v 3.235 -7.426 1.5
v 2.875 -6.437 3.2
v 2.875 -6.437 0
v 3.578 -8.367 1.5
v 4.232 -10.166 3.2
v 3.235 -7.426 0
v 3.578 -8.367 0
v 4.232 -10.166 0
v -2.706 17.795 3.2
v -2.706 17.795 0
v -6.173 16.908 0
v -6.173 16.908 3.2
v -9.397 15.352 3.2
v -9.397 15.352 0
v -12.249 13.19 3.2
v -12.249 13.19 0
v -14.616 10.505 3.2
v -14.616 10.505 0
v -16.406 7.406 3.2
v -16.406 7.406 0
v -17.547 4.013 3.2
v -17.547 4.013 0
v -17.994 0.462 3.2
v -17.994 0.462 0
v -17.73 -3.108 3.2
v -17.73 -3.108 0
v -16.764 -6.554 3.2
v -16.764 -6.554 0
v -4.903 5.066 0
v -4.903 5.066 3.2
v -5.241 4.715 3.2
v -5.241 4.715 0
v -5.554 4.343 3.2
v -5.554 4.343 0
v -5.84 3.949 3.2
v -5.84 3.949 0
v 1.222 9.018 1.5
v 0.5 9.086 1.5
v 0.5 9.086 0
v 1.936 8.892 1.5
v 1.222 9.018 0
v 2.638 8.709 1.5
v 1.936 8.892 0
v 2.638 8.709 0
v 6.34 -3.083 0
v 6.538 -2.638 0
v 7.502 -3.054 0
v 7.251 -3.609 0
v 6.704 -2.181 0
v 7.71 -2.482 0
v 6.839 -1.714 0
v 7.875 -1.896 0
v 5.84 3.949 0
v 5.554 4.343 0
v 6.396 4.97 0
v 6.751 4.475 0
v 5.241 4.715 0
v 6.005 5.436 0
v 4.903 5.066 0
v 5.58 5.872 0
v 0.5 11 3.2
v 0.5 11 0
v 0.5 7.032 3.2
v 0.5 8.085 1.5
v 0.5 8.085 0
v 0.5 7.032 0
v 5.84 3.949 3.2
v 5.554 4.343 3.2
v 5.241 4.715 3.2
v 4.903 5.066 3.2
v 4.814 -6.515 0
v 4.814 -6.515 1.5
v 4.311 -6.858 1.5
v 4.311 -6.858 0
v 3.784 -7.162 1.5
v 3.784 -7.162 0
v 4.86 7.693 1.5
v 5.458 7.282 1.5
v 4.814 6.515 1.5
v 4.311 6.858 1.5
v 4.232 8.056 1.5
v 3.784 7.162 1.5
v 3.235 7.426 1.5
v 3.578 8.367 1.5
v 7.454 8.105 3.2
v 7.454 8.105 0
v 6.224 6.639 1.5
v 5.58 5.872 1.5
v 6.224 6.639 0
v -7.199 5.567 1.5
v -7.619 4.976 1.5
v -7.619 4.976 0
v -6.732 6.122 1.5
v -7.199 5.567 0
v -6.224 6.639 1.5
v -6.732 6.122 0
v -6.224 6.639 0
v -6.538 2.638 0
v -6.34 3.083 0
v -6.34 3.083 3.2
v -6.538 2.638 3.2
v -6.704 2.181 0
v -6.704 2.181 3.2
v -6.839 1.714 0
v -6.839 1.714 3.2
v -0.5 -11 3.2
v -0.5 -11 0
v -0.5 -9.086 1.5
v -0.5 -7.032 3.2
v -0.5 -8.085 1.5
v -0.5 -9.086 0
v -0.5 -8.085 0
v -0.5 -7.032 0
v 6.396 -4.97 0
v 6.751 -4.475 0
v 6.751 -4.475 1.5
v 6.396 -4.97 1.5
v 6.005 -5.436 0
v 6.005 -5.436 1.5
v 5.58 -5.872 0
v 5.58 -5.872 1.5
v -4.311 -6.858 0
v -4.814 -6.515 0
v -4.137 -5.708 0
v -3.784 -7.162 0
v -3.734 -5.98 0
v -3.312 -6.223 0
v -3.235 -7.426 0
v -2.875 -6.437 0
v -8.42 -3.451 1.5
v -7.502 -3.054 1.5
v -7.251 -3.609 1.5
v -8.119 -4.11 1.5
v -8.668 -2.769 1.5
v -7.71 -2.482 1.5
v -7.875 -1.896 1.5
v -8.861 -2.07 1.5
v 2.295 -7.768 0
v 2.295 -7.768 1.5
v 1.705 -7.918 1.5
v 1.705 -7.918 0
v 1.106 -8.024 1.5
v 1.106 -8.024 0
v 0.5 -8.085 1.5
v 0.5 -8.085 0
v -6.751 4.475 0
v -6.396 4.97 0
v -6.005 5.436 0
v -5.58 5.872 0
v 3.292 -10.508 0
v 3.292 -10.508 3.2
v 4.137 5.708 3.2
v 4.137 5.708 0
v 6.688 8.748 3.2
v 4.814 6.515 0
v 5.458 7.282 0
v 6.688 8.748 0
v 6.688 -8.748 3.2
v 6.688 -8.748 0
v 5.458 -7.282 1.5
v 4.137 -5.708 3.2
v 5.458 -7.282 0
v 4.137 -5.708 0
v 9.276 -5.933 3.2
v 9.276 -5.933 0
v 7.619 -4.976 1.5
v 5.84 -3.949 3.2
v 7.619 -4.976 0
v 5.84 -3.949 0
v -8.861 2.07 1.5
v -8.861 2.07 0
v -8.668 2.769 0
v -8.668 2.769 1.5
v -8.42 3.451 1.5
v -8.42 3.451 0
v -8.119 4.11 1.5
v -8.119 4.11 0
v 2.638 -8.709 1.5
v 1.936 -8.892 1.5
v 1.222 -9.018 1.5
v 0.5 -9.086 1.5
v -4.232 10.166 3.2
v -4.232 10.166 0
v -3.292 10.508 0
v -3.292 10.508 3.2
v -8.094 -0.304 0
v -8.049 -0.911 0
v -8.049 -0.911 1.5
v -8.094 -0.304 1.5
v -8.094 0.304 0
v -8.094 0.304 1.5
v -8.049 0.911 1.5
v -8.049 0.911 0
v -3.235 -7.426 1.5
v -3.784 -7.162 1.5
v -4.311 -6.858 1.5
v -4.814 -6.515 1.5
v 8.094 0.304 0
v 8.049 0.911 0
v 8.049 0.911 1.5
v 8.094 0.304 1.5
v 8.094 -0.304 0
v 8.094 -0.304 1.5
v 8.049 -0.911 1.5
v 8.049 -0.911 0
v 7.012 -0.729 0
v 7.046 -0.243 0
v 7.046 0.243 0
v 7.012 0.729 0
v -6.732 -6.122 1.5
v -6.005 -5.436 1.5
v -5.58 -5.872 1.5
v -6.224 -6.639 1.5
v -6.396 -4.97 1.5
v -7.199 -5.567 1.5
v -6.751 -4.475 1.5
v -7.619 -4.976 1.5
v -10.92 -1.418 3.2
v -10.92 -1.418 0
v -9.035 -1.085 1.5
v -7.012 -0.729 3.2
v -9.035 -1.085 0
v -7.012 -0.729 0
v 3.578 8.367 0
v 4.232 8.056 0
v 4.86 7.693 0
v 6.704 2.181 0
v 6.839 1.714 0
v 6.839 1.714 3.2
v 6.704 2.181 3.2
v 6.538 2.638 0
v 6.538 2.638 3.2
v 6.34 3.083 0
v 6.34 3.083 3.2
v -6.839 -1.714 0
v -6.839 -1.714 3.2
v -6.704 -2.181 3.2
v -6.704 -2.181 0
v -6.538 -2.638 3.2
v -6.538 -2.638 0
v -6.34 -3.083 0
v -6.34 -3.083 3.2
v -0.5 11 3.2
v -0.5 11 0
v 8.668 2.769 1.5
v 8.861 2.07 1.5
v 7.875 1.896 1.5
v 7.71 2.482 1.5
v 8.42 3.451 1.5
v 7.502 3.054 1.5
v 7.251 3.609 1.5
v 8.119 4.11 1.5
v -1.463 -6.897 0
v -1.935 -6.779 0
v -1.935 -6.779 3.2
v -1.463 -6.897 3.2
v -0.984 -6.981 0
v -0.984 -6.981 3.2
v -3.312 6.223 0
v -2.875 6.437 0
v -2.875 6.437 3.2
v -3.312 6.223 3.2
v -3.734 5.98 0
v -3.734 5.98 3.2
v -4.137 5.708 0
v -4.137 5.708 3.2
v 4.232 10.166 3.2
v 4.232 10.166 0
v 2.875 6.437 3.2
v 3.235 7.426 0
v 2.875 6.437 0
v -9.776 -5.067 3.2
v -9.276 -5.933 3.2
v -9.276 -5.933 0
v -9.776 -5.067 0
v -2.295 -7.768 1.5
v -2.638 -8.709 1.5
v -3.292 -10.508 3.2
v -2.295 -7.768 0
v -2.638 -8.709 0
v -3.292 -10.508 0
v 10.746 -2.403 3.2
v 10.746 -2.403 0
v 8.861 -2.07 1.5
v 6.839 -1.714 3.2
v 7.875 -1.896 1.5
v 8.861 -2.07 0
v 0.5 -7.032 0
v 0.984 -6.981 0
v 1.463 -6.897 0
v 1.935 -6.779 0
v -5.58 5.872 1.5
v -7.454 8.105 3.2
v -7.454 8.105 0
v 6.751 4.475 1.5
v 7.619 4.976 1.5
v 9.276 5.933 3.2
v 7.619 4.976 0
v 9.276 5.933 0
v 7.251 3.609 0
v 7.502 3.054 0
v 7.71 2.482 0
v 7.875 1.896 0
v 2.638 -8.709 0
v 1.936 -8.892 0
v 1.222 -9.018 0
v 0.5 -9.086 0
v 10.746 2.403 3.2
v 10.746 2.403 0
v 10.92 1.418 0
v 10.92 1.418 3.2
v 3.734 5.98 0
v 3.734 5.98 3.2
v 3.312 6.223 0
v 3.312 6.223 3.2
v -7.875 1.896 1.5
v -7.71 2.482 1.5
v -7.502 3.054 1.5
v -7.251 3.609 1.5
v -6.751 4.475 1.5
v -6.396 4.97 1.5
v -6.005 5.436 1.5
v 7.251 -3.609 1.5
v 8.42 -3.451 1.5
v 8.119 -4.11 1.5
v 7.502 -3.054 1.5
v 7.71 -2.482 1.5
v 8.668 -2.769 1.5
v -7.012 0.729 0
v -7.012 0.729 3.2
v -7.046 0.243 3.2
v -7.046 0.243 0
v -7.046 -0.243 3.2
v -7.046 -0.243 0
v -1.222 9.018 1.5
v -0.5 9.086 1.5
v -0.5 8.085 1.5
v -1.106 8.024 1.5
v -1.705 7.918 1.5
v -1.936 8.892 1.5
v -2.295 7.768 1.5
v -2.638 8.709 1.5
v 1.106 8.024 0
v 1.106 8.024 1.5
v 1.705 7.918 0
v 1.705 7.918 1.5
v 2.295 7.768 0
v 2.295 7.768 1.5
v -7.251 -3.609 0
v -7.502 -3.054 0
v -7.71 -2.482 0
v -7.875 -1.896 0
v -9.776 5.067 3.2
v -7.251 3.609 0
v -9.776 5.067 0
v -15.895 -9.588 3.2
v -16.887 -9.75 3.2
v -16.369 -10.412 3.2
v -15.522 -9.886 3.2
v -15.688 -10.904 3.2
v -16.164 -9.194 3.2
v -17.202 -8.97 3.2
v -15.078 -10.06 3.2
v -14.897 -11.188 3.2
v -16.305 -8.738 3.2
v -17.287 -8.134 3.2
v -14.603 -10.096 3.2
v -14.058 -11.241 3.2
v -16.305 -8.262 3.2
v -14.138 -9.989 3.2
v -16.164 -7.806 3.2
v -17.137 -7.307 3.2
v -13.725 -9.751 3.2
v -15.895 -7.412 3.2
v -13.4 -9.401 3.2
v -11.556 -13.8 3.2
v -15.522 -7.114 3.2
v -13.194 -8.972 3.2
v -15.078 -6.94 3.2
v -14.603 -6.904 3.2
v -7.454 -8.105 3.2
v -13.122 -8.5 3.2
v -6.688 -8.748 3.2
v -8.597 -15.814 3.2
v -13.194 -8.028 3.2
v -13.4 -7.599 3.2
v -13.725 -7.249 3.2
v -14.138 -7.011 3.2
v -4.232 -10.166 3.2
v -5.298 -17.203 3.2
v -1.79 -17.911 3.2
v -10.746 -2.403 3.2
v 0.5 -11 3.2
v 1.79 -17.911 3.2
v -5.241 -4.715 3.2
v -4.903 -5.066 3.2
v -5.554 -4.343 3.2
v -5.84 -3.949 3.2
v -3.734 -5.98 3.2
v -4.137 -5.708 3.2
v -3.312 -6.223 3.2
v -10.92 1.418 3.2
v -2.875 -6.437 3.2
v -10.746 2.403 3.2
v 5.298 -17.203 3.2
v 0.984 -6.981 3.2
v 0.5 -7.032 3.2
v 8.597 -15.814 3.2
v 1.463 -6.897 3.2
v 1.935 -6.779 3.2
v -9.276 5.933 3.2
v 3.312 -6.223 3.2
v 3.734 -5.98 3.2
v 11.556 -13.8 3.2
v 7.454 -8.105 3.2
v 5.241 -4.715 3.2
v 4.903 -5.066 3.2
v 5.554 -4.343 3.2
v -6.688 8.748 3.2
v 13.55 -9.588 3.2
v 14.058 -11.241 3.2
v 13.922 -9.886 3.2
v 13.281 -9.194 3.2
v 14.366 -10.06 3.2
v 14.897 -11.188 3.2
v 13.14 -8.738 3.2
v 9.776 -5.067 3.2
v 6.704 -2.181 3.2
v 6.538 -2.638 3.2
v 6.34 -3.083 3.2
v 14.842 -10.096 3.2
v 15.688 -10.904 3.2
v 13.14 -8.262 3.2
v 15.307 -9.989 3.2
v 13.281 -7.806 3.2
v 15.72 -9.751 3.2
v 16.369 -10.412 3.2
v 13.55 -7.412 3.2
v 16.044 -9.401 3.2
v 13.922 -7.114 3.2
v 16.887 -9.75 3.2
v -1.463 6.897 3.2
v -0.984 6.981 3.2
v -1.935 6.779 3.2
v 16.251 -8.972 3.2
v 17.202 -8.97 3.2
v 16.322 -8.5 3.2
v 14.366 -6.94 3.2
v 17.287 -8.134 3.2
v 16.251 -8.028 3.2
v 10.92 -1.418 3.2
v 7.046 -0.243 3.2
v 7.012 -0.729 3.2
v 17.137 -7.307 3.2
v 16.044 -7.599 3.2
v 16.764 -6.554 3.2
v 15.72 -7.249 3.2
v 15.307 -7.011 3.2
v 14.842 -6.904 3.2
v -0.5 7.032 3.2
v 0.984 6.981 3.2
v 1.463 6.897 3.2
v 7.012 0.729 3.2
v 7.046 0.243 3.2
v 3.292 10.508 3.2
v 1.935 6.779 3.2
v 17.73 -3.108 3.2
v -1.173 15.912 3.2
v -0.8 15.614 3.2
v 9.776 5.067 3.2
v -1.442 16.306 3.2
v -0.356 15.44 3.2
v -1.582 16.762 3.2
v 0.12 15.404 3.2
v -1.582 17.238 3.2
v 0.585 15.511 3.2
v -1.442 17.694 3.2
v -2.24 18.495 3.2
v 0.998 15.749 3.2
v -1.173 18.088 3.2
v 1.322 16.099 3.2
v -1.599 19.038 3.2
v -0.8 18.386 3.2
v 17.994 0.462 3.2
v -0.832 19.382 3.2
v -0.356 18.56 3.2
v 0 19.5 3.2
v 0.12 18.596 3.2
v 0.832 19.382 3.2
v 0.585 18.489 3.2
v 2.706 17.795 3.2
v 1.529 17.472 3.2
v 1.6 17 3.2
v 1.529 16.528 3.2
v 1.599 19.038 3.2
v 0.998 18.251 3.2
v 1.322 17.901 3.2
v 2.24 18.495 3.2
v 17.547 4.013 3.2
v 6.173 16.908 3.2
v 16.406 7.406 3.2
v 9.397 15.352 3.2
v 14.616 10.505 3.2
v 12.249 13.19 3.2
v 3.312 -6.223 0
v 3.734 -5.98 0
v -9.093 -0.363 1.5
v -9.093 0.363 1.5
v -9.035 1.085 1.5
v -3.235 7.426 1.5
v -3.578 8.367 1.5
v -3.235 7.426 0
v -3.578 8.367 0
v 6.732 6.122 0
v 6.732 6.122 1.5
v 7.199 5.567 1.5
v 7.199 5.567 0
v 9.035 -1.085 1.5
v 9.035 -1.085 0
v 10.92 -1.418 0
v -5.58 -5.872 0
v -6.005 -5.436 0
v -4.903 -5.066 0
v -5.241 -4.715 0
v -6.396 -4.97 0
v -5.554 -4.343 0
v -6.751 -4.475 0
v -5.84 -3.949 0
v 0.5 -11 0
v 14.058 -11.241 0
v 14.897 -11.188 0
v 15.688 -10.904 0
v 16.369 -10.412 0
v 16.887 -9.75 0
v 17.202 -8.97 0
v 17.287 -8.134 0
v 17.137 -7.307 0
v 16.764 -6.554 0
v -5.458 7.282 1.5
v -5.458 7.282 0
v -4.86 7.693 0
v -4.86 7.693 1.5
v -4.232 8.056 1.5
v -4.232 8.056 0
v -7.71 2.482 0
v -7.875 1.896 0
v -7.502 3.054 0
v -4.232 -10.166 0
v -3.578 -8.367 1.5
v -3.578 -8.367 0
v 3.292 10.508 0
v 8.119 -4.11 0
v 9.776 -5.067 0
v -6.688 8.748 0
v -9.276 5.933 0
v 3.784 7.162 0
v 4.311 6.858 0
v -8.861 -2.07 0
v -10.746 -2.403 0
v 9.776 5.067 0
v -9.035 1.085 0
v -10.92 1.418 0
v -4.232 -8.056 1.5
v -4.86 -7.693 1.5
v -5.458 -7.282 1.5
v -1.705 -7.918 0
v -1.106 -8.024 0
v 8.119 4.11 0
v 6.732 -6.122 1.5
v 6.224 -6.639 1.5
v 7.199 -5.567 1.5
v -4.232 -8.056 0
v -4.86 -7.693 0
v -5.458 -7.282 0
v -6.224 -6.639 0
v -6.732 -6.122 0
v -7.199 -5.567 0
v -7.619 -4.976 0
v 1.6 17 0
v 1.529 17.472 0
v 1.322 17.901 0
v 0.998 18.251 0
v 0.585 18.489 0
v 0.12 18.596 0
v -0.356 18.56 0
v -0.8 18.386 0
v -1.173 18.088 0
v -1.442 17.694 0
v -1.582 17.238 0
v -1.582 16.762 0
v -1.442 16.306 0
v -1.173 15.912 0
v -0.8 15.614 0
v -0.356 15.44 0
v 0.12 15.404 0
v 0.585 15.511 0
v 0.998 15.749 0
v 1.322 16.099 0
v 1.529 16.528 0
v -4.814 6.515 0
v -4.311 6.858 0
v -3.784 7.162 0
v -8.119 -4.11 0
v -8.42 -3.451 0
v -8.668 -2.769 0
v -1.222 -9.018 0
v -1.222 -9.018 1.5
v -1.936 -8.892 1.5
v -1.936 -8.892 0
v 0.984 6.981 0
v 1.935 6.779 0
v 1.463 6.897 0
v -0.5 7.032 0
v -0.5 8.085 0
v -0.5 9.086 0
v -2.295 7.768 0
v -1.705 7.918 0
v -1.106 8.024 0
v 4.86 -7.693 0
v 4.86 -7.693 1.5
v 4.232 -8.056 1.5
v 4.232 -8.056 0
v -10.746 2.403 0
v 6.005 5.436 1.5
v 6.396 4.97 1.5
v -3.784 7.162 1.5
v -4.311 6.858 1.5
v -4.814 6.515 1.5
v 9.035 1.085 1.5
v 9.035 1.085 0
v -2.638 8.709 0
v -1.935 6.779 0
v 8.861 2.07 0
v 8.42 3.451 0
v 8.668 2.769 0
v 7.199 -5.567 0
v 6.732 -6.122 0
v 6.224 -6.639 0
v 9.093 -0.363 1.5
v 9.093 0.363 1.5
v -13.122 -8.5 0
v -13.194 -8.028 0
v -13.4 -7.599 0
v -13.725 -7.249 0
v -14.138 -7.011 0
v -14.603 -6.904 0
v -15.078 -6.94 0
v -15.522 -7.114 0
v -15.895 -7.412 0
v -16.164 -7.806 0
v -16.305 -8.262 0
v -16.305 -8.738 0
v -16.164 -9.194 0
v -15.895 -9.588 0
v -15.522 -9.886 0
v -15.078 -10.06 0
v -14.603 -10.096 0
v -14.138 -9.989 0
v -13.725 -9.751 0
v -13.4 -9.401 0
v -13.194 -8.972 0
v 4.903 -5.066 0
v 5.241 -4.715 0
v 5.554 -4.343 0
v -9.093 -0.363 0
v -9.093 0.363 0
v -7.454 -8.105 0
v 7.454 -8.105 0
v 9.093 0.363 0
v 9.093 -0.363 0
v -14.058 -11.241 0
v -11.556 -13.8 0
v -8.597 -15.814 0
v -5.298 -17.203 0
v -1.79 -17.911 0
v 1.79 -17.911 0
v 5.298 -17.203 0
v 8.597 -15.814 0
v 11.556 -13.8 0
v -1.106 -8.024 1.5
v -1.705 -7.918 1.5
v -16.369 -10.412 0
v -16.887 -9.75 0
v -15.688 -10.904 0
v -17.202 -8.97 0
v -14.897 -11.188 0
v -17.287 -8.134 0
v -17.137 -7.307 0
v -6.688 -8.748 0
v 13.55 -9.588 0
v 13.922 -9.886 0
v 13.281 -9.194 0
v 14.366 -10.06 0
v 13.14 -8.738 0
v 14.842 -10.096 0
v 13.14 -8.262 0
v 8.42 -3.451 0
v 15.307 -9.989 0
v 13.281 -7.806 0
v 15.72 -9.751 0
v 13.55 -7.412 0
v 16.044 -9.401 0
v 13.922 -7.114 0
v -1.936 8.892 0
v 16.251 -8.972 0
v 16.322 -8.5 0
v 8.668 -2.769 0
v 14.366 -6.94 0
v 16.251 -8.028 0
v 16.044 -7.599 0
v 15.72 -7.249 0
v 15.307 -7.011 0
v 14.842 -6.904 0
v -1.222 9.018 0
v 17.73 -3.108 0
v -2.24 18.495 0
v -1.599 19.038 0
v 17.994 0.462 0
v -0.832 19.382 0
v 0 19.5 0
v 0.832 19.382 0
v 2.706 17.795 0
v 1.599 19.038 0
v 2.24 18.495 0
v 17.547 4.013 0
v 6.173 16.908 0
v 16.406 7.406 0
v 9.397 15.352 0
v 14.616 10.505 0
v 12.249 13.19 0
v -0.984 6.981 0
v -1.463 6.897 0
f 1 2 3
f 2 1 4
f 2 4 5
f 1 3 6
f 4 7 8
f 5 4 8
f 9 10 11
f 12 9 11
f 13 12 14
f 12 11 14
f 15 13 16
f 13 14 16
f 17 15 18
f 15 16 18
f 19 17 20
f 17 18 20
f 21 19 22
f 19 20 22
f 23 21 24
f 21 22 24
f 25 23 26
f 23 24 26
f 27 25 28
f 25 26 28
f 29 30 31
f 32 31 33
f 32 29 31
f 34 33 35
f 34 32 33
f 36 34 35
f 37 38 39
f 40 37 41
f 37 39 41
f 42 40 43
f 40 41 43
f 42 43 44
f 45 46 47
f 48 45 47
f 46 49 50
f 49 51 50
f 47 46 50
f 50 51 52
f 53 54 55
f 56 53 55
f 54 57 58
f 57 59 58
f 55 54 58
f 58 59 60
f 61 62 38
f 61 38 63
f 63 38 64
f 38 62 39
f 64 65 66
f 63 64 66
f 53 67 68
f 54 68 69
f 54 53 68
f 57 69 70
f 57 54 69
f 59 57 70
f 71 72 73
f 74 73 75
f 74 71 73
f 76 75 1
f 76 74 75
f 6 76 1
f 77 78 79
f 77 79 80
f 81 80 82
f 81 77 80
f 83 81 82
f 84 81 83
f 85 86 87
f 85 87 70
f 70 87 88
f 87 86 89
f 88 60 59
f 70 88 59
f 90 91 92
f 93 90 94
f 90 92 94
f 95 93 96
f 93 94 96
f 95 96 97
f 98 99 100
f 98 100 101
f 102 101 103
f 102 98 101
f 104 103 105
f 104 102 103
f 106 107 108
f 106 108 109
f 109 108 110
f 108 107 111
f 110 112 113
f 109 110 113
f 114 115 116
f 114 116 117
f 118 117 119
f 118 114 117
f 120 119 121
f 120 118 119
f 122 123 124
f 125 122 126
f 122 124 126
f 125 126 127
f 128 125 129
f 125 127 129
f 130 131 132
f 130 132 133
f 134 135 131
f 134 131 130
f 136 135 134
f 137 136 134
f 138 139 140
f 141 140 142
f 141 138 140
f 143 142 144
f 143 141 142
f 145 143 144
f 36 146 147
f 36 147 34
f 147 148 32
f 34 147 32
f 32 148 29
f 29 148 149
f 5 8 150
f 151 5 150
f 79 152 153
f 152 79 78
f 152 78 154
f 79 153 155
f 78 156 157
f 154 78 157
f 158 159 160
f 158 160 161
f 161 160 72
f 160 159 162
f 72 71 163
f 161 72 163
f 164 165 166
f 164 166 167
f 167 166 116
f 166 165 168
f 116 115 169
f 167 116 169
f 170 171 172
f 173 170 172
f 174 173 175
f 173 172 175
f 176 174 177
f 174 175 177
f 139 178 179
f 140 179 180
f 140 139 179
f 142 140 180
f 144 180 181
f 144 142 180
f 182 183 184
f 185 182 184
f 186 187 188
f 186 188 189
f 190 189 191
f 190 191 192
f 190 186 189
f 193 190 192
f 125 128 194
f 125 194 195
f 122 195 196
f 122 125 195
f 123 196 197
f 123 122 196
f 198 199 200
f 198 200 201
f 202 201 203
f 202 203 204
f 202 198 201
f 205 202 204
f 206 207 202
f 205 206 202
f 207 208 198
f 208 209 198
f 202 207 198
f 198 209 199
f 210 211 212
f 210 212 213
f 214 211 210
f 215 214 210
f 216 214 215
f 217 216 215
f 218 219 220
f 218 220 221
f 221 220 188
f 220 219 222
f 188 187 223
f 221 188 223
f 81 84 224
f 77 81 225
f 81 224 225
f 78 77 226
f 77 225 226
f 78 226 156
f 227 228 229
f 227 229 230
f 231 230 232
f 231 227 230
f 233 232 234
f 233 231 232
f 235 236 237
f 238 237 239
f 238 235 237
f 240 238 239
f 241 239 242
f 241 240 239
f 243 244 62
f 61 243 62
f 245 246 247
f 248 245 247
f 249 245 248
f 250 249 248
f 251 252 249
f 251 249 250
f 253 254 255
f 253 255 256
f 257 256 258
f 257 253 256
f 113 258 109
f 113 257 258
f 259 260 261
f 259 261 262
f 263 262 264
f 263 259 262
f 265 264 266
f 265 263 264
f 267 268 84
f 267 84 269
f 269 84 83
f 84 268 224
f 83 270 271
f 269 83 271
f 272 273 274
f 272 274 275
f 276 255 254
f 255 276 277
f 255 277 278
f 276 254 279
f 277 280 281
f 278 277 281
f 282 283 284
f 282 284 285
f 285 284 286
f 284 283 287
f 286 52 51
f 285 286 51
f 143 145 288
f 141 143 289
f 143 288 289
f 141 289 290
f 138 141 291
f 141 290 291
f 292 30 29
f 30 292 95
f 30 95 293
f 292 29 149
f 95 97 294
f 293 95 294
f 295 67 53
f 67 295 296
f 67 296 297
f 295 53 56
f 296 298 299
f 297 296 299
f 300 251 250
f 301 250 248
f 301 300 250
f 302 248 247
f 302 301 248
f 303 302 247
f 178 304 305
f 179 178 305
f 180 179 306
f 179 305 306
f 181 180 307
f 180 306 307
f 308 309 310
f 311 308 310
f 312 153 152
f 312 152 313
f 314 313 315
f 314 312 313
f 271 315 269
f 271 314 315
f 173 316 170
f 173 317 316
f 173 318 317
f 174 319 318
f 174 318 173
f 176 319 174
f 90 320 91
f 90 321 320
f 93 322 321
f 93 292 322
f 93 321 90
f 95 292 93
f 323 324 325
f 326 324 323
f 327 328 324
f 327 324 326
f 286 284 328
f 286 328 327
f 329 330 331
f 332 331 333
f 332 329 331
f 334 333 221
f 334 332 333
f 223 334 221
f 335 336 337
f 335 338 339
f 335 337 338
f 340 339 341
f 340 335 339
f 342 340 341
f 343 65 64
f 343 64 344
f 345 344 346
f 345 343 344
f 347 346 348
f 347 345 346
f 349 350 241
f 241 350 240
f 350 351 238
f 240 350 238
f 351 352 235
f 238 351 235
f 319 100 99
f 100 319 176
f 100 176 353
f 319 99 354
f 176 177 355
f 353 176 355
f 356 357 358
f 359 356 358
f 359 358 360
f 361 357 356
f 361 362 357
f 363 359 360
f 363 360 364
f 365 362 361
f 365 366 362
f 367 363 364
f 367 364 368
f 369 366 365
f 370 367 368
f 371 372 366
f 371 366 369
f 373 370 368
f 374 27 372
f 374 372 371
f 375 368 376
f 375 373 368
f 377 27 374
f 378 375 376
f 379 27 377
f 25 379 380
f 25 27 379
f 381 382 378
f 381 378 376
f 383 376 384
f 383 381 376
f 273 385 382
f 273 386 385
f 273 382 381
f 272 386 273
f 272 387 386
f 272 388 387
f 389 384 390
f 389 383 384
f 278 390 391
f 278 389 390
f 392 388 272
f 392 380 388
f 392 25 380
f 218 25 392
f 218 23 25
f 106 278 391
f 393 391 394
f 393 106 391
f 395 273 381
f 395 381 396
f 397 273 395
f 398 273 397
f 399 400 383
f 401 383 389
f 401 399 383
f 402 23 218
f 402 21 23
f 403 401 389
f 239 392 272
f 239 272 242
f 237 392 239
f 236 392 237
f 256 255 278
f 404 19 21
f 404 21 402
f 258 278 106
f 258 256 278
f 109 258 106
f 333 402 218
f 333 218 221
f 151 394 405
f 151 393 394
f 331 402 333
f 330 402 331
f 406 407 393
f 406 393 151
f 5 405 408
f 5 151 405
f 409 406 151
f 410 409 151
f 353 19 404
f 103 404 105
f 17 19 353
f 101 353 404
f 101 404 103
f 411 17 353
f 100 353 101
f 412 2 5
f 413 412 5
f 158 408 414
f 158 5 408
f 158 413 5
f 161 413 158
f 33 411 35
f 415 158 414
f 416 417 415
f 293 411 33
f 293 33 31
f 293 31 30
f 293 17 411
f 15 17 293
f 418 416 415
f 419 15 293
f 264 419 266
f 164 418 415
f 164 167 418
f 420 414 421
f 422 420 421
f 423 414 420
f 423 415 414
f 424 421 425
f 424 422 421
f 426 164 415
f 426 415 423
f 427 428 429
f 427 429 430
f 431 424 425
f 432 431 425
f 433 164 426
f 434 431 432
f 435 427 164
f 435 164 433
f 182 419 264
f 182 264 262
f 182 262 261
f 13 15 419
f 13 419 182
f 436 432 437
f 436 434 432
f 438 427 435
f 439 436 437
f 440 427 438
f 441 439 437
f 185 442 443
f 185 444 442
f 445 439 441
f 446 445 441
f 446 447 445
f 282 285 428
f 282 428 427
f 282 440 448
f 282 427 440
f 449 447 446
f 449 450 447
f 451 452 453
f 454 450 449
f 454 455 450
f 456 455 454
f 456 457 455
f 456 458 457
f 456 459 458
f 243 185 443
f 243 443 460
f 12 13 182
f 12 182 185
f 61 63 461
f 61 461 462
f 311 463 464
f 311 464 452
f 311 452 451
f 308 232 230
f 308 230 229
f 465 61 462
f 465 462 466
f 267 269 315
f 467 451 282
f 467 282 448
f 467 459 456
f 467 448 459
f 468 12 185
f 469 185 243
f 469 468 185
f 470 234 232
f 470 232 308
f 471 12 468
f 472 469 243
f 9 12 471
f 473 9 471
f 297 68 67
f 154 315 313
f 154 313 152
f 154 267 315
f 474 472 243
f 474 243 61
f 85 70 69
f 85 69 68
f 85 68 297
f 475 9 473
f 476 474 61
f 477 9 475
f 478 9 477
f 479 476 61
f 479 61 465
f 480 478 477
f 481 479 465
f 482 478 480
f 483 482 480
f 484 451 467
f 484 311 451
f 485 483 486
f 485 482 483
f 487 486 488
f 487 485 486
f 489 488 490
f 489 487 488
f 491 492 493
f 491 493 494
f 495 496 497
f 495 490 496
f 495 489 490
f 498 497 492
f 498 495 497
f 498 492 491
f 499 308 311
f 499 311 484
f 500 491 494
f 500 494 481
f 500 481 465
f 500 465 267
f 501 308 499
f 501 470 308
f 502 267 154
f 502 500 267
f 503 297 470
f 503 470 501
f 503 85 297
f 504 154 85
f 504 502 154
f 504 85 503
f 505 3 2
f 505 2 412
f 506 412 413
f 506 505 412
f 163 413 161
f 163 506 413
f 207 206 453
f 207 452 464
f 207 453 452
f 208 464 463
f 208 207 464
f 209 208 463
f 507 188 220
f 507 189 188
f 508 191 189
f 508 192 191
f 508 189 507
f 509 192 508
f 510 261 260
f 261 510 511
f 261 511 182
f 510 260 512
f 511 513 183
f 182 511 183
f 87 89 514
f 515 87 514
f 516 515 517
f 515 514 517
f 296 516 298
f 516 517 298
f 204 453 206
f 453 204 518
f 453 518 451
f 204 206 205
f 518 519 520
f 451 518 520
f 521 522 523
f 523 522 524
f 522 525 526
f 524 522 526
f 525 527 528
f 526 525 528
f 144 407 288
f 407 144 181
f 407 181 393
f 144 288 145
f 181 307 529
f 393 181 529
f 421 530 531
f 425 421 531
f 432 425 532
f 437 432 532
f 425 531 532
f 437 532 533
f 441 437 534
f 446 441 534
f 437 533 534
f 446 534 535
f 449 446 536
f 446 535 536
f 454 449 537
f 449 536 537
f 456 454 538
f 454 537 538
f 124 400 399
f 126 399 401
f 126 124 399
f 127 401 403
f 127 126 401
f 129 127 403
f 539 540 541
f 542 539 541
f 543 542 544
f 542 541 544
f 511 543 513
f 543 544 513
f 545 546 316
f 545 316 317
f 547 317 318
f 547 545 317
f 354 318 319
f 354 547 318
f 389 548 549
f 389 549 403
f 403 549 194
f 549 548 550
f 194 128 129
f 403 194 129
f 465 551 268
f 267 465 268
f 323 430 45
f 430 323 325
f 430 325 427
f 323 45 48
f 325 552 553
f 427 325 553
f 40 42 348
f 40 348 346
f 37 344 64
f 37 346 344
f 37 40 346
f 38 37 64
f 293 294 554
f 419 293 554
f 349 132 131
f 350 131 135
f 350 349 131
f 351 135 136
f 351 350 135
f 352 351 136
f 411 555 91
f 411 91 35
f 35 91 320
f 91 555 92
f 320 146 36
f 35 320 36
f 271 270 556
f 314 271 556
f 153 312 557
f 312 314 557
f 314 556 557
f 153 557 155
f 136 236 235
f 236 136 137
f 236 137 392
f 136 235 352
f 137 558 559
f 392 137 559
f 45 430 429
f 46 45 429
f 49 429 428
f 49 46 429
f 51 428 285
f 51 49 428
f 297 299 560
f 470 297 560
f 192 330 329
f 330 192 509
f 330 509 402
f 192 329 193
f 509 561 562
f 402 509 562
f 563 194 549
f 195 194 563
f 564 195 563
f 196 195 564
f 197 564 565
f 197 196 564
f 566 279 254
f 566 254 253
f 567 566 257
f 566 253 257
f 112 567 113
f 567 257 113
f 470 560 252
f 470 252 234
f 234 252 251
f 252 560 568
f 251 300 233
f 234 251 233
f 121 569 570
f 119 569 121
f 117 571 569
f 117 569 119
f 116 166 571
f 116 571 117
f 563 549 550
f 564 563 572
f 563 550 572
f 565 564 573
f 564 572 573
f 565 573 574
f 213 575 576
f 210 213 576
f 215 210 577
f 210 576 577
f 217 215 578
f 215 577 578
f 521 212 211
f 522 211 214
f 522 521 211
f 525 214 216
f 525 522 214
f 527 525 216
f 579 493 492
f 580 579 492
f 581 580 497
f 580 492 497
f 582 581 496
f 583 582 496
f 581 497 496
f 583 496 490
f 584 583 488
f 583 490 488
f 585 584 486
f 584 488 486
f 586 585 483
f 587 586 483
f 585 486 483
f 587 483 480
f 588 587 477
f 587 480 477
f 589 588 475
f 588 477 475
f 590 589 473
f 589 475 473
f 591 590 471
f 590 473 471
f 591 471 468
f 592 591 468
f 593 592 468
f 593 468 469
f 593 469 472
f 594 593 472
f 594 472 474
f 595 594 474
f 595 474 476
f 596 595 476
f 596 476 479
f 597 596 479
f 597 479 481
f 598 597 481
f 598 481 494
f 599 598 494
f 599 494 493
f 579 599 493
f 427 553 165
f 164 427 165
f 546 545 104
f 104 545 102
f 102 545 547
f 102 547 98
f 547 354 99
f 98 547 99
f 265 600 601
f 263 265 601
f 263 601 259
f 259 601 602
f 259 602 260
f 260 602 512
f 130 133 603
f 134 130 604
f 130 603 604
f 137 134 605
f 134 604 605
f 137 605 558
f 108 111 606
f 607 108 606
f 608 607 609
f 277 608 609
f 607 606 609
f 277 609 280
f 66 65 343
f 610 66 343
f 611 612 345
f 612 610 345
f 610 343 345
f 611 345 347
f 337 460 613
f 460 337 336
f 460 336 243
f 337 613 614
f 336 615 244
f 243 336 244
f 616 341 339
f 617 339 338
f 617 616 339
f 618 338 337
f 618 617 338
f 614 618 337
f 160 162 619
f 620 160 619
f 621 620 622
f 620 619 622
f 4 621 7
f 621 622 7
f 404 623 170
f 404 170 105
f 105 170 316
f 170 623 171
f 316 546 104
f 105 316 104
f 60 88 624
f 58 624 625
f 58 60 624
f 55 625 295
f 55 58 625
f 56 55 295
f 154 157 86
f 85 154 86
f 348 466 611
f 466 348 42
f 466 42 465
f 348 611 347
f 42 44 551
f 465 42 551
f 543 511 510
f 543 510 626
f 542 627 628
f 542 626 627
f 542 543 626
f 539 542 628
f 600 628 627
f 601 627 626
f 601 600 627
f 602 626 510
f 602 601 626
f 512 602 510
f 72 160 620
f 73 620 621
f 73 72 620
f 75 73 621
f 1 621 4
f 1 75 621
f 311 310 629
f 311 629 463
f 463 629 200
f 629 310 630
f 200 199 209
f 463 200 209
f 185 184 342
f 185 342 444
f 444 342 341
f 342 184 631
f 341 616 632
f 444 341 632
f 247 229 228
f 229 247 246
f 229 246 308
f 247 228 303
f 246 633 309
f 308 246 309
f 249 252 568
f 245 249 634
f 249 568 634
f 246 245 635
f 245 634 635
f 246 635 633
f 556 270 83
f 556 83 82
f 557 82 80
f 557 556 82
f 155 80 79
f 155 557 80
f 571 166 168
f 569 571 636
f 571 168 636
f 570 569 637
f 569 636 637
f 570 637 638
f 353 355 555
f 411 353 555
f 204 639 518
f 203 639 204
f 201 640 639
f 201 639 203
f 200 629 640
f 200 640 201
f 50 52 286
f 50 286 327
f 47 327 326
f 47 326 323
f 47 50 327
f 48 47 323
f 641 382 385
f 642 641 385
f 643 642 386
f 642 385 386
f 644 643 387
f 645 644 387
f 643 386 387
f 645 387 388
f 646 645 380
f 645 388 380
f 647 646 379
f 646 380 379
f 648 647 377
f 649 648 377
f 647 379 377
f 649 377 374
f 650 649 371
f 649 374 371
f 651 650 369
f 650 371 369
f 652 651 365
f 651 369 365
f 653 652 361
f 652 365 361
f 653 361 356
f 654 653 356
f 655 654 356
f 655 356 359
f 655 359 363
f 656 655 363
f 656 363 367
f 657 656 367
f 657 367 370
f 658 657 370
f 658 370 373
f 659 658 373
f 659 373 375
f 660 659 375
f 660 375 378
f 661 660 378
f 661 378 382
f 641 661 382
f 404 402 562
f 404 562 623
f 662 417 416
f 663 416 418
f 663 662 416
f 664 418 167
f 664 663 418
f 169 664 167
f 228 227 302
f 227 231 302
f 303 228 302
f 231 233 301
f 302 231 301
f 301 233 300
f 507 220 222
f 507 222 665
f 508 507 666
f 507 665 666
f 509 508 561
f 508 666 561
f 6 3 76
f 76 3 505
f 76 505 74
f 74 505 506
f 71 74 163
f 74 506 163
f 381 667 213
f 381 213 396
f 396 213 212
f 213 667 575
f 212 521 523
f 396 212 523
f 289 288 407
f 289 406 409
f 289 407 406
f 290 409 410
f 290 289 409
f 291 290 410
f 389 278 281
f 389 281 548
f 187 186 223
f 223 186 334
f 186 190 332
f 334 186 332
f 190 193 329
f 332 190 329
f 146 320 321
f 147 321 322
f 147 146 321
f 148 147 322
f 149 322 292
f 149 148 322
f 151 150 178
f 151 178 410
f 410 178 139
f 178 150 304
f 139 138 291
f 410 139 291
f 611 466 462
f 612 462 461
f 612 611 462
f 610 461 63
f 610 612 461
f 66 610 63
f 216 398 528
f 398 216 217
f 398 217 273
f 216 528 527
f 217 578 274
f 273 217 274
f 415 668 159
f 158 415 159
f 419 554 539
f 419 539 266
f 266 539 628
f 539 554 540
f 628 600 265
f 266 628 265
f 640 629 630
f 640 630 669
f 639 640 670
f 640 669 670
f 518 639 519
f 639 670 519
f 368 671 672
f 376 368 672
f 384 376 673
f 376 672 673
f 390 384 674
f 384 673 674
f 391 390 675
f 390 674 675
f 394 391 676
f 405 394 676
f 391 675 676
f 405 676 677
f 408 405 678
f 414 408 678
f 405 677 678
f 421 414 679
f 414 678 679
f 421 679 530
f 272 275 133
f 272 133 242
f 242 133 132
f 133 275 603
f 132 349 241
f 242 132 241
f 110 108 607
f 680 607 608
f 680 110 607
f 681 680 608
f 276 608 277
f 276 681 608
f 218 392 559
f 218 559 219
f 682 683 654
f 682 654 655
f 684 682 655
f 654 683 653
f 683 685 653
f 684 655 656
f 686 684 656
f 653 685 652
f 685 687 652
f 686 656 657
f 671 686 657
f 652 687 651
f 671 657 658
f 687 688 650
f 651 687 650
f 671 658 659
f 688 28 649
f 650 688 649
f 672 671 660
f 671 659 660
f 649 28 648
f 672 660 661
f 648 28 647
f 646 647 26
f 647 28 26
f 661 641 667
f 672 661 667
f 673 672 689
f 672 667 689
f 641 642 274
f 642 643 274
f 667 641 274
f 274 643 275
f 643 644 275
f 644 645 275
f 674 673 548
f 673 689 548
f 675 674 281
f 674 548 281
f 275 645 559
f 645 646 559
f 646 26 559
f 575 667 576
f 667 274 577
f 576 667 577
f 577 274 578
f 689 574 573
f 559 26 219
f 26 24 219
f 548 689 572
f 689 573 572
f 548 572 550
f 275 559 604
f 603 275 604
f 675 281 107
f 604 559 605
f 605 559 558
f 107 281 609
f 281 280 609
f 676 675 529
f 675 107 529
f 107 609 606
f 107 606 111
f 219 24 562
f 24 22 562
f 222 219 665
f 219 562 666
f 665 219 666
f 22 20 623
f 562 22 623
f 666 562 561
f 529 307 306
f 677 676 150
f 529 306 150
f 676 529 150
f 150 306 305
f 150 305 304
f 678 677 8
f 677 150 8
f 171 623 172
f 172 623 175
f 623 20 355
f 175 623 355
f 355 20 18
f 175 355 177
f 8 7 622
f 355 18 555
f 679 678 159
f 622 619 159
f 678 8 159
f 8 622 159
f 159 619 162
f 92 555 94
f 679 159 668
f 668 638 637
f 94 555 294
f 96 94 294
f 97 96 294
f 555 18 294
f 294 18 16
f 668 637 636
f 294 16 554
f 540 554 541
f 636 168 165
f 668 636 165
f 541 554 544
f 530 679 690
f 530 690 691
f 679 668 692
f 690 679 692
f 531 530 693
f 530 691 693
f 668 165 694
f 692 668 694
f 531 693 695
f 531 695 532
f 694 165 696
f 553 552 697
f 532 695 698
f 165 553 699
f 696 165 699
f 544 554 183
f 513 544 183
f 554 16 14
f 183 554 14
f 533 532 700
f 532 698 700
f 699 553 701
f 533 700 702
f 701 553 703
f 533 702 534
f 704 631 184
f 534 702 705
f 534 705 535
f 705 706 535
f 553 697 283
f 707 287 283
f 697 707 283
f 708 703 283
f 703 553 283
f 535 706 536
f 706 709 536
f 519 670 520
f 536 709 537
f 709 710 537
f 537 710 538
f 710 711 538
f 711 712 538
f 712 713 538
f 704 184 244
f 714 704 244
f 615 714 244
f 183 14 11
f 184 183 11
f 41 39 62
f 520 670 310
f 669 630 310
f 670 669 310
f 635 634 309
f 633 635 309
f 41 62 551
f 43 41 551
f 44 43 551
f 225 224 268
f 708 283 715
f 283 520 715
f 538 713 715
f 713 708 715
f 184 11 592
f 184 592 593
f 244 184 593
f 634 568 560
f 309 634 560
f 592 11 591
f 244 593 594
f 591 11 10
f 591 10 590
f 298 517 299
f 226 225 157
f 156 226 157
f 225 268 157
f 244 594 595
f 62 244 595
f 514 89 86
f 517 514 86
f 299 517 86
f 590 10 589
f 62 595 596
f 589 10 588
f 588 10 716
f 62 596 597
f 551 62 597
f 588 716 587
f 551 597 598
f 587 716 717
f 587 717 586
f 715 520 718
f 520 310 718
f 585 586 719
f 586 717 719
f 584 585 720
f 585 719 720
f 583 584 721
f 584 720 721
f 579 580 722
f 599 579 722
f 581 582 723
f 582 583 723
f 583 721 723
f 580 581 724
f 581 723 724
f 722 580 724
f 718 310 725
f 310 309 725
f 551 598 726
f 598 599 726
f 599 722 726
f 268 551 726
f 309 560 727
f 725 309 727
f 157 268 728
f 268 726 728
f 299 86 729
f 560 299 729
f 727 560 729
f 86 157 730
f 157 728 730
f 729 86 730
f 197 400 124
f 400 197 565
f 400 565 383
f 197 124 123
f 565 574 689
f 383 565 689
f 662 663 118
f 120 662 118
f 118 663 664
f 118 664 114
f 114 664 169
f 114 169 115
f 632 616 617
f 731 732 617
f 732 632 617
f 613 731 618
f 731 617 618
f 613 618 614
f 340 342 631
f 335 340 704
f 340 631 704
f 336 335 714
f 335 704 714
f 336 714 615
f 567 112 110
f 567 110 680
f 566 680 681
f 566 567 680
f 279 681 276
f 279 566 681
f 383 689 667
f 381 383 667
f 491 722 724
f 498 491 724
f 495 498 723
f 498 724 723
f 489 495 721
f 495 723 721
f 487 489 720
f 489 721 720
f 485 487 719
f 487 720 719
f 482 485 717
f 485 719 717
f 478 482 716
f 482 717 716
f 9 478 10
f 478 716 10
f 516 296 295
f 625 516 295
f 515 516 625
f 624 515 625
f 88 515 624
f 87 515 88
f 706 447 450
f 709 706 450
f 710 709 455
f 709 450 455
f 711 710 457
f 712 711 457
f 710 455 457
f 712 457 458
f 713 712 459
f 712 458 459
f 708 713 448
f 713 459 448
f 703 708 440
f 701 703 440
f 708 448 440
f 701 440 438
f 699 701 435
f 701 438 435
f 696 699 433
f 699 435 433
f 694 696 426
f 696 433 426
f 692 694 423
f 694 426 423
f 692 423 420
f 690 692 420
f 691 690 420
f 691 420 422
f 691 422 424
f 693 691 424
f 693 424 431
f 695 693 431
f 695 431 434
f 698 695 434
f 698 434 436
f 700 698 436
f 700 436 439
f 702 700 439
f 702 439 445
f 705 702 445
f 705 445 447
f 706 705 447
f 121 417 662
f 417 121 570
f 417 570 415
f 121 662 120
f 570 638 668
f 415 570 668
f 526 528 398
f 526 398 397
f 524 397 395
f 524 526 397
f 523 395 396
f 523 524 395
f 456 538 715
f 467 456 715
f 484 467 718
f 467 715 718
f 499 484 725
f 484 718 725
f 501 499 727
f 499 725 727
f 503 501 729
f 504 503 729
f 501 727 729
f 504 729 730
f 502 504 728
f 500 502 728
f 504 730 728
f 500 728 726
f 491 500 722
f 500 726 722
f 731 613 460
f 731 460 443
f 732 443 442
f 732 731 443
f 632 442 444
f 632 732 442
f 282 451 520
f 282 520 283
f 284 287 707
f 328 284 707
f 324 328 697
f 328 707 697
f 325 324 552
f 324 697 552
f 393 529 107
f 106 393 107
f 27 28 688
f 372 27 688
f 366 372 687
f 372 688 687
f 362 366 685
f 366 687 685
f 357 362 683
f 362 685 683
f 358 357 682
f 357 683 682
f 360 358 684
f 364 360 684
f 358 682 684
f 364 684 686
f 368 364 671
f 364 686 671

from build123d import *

# Parameters (mm, degrees)
SKETCH_1_R               = 7.05
EXTRUDE_1_DEPTH          = 3.2
SKETCH_2_R               = 1.6
CUT_EXTRUDE_1_DEPTH      = 10
CUT_EXTRUDE_START        = 27.729945754
CUT_EXTRUDE_3_DEPTH      = 31.729945754
PATTERN_CIRCULAR_1_COUNT = 18
SKETCH_4_R               = 9.1
SKETCH_4_R_2             = 8.1
CUT_EXTRUDE_4_DEPTH      = 1.5


with BuildPart() as part:
    # 草图1 → 凸台-拉伸1 (new body)
    with BuildSketch(Plane.XY):
        with BuildLine():
            ThreePointArc((-14.058374697, -11.241089844), (0, -18), (14.058374697, -11.241089844))
            ThreePointArc((14.058374697, -11.241089844), (16.887495374, -9.75), (16.76425672, -6.554364701))
            ThreePointArc((16.76425672, -6.554364701), (15.588457268, 9), (2.705882023, 17.795454545))
            ThreePointArc((2.705882023, 17.795454545), (0, 19.5), (-2.705882023, 17.795454545))
            ThreePointArc((-2.705882023, 17.795454545), (-15.588457268, 9), (-16.76425672, -6.554364701))
            ThreePointArc((-16.76425672, -6.554364701), (-16.887495374, -9.75), (-14.058374697, -11.241089844))
        make_face()
        Circle(SKETCH_1_R, mode=Mode.SUBTRACT)
    extrude(amount=EXTRUDE_1_DEPTH)

    # 草图2 → 切除-拉伸1 (cut)
    with BuildSketch(Plane.XY.offset(3.2)):
        with Locations((0, 17)):
            Circle(SKETCH_2_R)
        with Locations((14.722431864, -8.5)):
            Circle(SKETCH_2_R)
        with Locations((-14.722431864, -8.5)):
            Circle(SKETCH_2_R)
    extrude(amount=-CUT_EXTRUDE_1_DEPTH, mode=Mode.SUBTRACT)

    # 草图3 → 切除-拉伸3 (cut)
    with BuildSketch(Plane(origin=(0, 0, 0), x_dir=(-1, 0, 0), z_dir=(0, 0, -1)).offset(CUT_EXTRUDE_START)):
        with BuildLine():
            ThreePointArc((-0.5, 7.032247152), (0, 7.05), (0.5, 7.032247152))
            Line((0.5, 7.032247152), (0.5, 11))
            Line((0.5, 11), (-0.5, 11))
            Line((-0.5, 11), (-0.5, 7.032247152))
        make_face()
    cut_extrude_3 = extrude(amount=-CUT_EXTRUDE_3_DEPTH, mode=Mode.SUBTRACT)

    # 阵列(圆周)1: 切除-拉伸3 ×18 about axis
    pattern_circular_1_axis = Axis((0, 0, 0), (0, 0, 1))
    for i in range(1, PATTERN_CIRCULAR_1_COUNT):
        add(cut_extrude_3.rotate(pattern_circular_1_axis, i * 360 / PATTERN_CIRCULAR_1_COUNT), mode=Mode.SUBTRACT)

    # 草图4 → 切除-拉伸4 (cut)
    with BuildSketch(Plane(origin=(0, 0, 0), x_dir=(-1, 0, 0), z_dir=(0, 0, -1))):
        Circle(SKETCH_4_R)
        Circle(SKETCH_4_R_2, mode=Mode.SUBTRACT)
    extrude(amount=-CUT_EXTRUDE_4_DEPTH, mode=Mode.SUBTRACT)


solid = part.part
